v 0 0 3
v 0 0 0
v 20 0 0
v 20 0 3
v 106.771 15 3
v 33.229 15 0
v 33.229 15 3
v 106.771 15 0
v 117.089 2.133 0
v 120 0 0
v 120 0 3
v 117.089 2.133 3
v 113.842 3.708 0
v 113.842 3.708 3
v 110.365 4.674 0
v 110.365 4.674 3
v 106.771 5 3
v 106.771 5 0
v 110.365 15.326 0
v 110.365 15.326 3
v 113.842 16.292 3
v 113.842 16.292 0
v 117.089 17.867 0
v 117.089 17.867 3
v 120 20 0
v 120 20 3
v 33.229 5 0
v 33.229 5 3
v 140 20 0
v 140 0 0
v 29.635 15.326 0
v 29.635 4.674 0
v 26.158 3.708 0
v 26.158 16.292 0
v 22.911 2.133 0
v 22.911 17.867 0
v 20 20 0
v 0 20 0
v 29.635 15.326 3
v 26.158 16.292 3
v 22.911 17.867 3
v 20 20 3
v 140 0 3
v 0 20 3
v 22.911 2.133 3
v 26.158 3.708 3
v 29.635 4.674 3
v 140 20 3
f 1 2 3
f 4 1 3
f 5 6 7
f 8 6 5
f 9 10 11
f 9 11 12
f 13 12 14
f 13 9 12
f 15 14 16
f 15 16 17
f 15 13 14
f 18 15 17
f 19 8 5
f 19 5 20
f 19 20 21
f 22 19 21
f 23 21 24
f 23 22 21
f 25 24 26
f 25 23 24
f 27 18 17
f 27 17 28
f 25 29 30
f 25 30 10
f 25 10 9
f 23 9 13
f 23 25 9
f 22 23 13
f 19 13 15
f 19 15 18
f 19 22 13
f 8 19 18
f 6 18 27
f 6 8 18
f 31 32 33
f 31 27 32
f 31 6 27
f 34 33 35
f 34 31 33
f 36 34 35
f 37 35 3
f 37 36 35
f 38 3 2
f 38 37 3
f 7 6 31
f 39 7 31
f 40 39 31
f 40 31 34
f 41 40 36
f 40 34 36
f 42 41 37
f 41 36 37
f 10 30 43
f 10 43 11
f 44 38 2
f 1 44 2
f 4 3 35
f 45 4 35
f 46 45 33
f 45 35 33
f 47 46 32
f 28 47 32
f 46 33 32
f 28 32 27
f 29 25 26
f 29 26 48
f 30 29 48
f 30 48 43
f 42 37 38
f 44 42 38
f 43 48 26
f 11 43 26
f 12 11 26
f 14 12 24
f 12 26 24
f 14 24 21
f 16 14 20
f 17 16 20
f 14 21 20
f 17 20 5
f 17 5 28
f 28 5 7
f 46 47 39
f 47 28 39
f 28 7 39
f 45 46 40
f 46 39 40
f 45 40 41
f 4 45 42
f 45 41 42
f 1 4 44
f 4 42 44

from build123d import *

# Parameters (mm, degrees)
BOSS_EXTRU_1_DEPTH = 3


with BuildPart() as part:
    # Esquisse1 → Boss.-Extru.1 (new body)
    with BuildSketch(Plane.XY):
        with BuildLine():
            Line((0, 20), (0, 0))
            Line((0, 0), (20, 0))
            ThreePointArc((20, 0), (26.157688743, 3.708286934), (33.228756555, 5))
            Line((33.228756555, 5), (70, 5))
            Line((70, 5), (70, 15))
            Line((70, 15), (33.228756555, 15))
            ThreePointArc((33.228756555, 15), (26.157688743, 16.291713066), (20, 20))
            Line((20, 20), (0, 20))
        make_face()
    boss_extru_1 = extrude(amount=BOSS_EXTRU_1_DEPTH)

    # Symétrie7: Boss.-Extru.1 across plane
    add(boss_extru_1.mirror(Plane(origin=(70, 15, 3), x_dir=(0, 0, 1), z_dir=(-1, 0, 0))))


solid = part.part
